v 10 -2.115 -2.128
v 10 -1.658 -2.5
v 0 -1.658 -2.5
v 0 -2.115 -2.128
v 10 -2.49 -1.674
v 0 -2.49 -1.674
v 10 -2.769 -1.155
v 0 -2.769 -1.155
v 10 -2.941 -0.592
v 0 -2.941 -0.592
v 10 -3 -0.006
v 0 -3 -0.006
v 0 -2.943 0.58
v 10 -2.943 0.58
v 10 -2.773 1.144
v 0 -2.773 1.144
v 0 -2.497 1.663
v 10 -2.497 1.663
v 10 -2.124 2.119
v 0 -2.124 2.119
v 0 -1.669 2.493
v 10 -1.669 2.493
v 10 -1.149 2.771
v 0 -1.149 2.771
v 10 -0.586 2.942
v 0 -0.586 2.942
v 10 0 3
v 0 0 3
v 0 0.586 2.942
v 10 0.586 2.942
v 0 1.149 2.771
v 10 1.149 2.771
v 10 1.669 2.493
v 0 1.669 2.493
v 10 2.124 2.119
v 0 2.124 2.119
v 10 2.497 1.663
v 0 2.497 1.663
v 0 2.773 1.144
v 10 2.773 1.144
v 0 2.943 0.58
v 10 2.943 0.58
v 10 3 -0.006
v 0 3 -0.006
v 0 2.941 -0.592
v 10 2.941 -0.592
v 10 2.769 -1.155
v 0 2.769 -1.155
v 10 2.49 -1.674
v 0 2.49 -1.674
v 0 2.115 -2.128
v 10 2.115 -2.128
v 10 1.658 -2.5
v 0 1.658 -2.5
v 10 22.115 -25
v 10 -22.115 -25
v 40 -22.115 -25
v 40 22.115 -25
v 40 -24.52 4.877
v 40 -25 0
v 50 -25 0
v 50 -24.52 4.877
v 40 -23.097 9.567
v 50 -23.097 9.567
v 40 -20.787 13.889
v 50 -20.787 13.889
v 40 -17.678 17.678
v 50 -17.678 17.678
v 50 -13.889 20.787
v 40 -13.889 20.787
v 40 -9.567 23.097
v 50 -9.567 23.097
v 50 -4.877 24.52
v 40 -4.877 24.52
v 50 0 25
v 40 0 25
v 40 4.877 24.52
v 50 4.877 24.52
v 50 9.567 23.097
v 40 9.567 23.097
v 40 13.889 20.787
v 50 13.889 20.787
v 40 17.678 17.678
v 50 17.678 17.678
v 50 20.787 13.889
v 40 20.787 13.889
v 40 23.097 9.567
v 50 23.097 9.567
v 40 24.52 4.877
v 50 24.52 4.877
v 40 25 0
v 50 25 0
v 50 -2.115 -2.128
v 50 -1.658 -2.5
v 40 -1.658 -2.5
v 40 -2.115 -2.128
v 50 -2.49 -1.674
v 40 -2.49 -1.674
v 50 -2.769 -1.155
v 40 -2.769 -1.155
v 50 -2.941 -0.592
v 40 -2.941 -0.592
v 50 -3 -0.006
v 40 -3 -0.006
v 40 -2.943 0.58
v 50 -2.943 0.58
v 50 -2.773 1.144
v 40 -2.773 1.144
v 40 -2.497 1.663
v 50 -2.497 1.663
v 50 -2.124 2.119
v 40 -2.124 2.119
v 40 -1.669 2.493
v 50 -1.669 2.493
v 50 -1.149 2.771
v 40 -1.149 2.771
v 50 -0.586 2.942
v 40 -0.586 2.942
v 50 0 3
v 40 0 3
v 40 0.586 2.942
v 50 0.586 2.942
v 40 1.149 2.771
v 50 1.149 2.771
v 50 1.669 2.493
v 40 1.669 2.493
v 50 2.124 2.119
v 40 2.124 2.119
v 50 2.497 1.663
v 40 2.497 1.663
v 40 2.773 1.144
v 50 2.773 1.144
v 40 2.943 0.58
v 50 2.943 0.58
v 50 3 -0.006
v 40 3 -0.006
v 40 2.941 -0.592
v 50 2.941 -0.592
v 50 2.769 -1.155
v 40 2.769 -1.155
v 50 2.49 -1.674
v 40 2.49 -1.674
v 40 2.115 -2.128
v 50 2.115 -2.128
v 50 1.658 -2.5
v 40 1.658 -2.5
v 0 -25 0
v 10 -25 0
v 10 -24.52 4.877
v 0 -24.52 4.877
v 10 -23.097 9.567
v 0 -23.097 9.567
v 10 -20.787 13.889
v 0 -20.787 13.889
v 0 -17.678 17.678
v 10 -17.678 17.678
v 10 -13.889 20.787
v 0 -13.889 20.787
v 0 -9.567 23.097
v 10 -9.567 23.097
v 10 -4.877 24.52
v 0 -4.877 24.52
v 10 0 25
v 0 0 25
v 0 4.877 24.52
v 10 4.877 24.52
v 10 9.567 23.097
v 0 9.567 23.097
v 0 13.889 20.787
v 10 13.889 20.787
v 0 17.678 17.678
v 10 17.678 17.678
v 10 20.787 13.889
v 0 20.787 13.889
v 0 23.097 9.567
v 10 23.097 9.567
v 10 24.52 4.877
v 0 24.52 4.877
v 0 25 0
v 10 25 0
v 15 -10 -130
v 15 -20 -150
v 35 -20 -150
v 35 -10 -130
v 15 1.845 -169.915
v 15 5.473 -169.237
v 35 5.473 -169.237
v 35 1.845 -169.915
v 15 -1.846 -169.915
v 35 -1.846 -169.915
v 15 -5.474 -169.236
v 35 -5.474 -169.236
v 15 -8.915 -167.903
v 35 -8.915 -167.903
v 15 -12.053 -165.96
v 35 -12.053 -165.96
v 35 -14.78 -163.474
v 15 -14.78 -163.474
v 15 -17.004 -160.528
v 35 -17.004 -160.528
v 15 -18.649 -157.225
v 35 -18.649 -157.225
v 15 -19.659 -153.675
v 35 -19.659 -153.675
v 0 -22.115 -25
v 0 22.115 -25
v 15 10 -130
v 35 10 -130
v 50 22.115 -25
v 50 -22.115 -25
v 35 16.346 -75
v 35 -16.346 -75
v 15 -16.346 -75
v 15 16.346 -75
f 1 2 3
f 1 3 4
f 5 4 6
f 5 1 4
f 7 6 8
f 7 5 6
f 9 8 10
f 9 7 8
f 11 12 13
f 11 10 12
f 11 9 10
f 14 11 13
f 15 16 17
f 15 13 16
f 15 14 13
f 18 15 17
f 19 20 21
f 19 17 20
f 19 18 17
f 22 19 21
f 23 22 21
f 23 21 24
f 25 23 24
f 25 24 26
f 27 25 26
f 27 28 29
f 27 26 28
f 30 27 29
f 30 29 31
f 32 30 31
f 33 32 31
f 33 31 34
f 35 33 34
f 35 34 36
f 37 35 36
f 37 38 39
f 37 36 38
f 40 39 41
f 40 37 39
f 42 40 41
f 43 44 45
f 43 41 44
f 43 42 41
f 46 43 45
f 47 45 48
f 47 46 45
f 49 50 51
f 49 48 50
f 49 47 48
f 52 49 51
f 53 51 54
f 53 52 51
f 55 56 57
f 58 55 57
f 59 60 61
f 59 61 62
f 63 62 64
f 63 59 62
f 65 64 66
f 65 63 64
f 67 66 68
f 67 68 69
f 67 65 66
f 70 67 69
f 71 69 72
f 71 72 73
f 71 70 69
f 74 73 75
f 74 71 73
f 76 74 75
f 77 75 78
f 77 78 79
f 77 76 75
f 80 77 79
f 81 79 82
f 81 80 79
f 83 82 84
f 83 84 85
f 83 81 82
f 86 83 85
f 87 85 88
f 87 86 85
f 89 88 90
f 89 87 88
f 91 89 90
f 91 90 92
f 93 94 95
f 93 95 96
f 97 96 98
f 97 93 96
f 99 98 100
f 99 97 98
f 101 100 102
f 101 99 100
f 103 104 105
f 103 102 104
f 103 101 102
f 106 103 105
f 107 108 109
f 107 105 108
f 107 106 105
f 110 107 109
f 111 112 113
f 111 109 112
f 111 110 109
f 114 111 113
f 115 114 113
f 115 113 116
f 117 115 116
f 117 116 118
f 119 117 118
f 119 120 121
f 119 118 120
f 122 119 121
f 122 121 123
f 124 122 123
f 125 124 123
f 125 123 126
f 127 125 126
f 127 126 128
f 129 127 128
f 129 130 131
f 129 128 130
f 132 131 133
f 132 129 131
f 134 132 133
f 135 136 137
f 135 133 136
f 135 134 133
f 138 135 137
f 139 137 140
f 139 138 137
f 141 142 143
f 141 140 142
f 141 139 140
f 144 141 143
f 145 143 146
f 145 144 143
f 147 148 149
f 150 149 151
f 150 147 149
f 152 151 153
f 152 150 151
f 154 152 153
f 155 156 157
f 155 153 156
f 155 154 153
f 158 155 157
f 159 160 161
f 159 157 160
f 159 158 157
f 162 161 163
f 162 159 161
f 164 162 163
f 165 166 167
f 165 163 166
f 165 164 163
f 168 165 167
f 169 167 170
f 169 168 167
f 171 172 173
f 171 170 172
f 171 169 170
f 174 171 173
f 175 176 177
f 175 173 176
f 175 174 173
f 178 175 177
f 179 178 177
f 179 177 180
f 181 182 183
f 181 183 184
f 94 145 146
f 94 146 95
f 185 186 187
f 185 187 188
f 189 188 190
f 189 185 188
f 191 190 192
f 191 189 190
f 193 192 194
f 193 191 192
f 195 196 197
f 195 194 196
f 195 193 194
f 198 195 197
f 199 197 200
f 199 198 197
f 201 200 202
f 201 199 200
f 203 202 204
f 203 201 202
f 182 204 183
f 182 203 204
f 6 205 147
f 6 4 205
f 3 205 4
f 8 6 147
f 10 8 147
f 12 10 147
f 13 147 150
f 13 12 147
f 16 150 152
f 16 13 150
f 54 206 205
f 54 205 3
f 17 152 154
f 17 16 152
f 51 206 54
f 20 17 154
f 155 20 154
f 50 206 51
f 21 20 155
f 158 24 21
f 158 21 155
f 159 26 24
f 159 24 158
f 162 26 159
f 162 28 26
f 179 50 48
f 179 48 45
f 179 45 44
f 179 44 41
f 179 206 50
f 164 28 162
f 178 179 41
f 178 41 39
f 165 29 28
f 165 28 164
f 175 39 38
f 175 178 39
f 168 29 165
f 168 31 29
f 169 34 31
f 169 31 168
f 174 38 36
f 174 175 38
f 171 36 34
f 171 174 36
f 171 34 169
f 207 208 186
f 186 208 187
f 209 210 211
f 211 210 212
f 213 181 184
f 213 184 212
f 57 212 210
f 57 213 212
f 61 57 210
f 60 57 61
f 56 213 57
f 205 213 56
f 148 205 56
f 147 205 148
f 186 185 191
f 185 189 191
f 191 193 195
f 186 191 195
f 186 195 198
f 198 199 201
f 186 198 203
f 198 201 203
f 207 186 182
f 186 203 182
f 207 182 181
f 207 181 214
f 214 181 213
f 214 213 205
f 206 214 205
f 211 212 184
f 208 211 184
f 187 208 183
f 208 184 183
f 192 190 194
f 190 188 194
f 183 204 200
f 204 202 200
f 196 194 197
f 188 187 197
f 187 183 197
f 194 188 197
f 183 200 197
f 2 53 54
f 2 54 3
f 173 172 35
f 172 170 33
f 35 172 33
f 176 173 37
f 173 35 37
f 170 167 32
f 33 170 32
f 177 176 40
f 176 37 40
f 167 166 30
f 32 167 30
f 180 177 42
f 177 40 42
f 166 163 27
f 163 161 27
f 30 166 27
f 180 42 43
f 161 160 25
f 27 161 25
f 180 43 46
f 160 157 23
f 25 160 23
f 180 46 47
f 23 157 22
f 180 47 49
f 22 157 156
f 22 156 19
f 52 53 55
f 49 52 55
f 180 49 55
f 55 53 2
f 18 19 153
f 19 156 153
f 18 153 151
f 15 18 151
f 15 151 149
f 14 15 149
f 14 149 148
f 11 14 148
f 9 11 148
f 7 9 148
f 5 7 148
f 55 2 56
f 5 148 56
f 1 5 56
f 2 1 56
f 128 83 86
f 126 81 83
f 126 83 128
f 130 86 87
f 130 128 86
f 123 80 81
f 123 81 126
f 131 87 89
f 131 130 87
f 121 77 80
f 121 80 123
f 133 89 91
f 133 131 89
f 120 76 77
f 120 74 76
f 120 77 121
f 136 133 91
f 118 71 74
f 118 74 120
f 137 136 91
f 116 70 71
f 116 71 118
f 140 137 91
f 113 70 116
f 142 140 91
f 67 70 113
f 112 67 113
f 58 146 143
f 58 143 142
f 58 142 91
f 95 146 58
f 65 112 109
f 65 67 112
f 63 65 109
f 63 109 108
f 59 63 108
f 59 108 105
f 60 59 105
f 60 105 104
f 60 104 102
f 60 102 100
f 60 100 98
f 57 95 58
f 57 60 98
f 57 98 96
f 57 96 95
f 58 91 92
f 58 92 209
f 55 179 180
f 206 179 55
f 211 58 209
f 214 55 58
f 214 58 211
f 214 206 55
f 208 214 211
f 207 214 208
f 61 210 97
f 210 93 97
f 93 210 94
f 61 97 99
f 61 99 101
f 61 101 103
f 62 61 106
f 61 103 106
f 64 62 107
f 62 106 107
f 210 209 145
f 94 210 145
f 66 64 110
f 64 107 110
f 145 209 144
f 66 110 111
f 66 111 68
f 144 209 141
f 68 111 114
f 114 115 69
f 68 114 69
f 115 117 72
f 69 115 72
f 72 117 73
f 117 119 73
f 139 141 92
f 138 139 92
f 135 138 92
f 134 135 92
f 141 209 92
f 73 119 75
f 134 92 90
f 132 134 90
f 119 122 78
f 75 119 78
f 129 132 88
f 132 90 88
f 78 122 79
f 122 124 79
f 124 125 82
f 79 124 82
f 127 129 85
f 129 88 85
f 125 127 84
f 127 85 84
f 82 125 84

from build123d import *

# Parameters (mm, degrees)
BOSS_EXTRUDE1_DEPTH     = 50
CUT_EXTRUDE1_DEPTH      = 179.955301682
CUT_EXTRUDE1_DEPTH_BACK = 179.955301682
CUT_EXTRUDE5_DEPTH      = 179.955301682
CUT_EXTRUDE5_DEPTH_BACK = 179.955301682
SKETCH5_W               = 30
SKETCH5_H               = 50
CUT_EXTRUDE6_DEPTH      = 176.356779168
CUT_EXTRUDE6_DEPTH_BACK = 176.356779168
CUT_EXTRUDE7_DEPTH      = 179.955301682
CUT_EXTRUDE7_DEPTH_BACK = 179.955301682


with BuildPart() as part:
    # Sketch1 → Boss-Extrude1 (new body)
    with BuildSketch(Plane(origin=(0, 0, 0), x_dir=(0, 0, -1), z_dir=(1, 0, 0))):
        with BuildLine():
            Line((0, 25), (130, 10))
            Line((130, 10), (150, 20))
            ThreePointArc((150, 20), (170, 0), (150, -20))
            Line((150, -20), (130, -10))
            Line((130, -10), (0, -25))
            ThreePointArc((0, -25), (-25, 0), (0, 25))
        make_face()
    extrude(amount=BOSS_EXTRUDE1_DEPTH)

    # Sketch3 → Cut-Extrude1 (cut, two sides: drawn at the far end of the back side and taken through both)
    with BuildSketch(Plane(origin=(0, 0, 0), x_dir=(1, 0, 0), z_dir=(0, 1, 0)).offset(-CUT_EXTRUDE1_DEPTH_BACK)):
        Polygon((15, 170), (15, 75), (0, 25), (-45.149252574, 25), (-45.149252574, 231.988814071), (97.66148476, 231.988814071), (97.66148476, 25), (50, 25), (35, 75), (35, 170), align=None)
    extrude(amount=CUT_EXTRUDE1_DEPTH + CUT_EXTRUDE1_DEPTH_BACK, mode=Mode.SUBTRACT)

    # Sketch5 → Cut-Extrude5 (cut, two sides: drawn at the far end of the back side and taken through both)
    with BuildSketch(Plane(origin=(0, 0, 0), x_dir=(1, 0, 0), z_dir=(0, 1, 0)).offset(-CUT_EXTRUDE5_DEPTH_BACK)):
        with Locations((25, 0)):
            Rectangle(SKETCH5_W, SKETCH5_H)
    extrude(amount=CUT_EXTRUDE5_DEPTH + CUT_EXTRUDE5_DEPTH_BACK, mode=Mode.SUBTRACT)

    # Sketch6 → Cut-Extrude6 (cut, two sides: drawn at the far end of the back side and taken through both)
    with BuildSketch(Plane.ZY.offset(-15).offset(-CUT_EXTRUDE6_DEPTH_BACK)):
        Polygon((-130, 10), (-189.136006784, 3.176614602), (-191.554152375, 31.687839347), (-130.171893451, 25.24666108), align=None)
    extrude(amount=CUT_EXTRUDE6_DEPTH + CUT_EXTRUDE6_DEPTH_BACK, mode=Mode.SUBTRACT)

    # Sketch7 → Cut-Extrude7 (cut, two sides: drawn at the far end of the back side and taken through both)
    with BuildSketch(Plane.ZY.offset(-CUT_EXTRUDE7_DEPTH_BACK)):
        with BuildLine():
            Line((-2.5, 1.658312395), (-2.5, -1.658312395))
            ThreePointArc((-2.5, -1.658312395), (3, 0), (-2.5, 1.658312395))
        make_face()
    extrude(amount=CUT_EXTRUDE7_DEPTH + CUT_EXTRUDE7_DEPTH_BACK, mode=Mode.SUBTRACT)


solid = part.part
